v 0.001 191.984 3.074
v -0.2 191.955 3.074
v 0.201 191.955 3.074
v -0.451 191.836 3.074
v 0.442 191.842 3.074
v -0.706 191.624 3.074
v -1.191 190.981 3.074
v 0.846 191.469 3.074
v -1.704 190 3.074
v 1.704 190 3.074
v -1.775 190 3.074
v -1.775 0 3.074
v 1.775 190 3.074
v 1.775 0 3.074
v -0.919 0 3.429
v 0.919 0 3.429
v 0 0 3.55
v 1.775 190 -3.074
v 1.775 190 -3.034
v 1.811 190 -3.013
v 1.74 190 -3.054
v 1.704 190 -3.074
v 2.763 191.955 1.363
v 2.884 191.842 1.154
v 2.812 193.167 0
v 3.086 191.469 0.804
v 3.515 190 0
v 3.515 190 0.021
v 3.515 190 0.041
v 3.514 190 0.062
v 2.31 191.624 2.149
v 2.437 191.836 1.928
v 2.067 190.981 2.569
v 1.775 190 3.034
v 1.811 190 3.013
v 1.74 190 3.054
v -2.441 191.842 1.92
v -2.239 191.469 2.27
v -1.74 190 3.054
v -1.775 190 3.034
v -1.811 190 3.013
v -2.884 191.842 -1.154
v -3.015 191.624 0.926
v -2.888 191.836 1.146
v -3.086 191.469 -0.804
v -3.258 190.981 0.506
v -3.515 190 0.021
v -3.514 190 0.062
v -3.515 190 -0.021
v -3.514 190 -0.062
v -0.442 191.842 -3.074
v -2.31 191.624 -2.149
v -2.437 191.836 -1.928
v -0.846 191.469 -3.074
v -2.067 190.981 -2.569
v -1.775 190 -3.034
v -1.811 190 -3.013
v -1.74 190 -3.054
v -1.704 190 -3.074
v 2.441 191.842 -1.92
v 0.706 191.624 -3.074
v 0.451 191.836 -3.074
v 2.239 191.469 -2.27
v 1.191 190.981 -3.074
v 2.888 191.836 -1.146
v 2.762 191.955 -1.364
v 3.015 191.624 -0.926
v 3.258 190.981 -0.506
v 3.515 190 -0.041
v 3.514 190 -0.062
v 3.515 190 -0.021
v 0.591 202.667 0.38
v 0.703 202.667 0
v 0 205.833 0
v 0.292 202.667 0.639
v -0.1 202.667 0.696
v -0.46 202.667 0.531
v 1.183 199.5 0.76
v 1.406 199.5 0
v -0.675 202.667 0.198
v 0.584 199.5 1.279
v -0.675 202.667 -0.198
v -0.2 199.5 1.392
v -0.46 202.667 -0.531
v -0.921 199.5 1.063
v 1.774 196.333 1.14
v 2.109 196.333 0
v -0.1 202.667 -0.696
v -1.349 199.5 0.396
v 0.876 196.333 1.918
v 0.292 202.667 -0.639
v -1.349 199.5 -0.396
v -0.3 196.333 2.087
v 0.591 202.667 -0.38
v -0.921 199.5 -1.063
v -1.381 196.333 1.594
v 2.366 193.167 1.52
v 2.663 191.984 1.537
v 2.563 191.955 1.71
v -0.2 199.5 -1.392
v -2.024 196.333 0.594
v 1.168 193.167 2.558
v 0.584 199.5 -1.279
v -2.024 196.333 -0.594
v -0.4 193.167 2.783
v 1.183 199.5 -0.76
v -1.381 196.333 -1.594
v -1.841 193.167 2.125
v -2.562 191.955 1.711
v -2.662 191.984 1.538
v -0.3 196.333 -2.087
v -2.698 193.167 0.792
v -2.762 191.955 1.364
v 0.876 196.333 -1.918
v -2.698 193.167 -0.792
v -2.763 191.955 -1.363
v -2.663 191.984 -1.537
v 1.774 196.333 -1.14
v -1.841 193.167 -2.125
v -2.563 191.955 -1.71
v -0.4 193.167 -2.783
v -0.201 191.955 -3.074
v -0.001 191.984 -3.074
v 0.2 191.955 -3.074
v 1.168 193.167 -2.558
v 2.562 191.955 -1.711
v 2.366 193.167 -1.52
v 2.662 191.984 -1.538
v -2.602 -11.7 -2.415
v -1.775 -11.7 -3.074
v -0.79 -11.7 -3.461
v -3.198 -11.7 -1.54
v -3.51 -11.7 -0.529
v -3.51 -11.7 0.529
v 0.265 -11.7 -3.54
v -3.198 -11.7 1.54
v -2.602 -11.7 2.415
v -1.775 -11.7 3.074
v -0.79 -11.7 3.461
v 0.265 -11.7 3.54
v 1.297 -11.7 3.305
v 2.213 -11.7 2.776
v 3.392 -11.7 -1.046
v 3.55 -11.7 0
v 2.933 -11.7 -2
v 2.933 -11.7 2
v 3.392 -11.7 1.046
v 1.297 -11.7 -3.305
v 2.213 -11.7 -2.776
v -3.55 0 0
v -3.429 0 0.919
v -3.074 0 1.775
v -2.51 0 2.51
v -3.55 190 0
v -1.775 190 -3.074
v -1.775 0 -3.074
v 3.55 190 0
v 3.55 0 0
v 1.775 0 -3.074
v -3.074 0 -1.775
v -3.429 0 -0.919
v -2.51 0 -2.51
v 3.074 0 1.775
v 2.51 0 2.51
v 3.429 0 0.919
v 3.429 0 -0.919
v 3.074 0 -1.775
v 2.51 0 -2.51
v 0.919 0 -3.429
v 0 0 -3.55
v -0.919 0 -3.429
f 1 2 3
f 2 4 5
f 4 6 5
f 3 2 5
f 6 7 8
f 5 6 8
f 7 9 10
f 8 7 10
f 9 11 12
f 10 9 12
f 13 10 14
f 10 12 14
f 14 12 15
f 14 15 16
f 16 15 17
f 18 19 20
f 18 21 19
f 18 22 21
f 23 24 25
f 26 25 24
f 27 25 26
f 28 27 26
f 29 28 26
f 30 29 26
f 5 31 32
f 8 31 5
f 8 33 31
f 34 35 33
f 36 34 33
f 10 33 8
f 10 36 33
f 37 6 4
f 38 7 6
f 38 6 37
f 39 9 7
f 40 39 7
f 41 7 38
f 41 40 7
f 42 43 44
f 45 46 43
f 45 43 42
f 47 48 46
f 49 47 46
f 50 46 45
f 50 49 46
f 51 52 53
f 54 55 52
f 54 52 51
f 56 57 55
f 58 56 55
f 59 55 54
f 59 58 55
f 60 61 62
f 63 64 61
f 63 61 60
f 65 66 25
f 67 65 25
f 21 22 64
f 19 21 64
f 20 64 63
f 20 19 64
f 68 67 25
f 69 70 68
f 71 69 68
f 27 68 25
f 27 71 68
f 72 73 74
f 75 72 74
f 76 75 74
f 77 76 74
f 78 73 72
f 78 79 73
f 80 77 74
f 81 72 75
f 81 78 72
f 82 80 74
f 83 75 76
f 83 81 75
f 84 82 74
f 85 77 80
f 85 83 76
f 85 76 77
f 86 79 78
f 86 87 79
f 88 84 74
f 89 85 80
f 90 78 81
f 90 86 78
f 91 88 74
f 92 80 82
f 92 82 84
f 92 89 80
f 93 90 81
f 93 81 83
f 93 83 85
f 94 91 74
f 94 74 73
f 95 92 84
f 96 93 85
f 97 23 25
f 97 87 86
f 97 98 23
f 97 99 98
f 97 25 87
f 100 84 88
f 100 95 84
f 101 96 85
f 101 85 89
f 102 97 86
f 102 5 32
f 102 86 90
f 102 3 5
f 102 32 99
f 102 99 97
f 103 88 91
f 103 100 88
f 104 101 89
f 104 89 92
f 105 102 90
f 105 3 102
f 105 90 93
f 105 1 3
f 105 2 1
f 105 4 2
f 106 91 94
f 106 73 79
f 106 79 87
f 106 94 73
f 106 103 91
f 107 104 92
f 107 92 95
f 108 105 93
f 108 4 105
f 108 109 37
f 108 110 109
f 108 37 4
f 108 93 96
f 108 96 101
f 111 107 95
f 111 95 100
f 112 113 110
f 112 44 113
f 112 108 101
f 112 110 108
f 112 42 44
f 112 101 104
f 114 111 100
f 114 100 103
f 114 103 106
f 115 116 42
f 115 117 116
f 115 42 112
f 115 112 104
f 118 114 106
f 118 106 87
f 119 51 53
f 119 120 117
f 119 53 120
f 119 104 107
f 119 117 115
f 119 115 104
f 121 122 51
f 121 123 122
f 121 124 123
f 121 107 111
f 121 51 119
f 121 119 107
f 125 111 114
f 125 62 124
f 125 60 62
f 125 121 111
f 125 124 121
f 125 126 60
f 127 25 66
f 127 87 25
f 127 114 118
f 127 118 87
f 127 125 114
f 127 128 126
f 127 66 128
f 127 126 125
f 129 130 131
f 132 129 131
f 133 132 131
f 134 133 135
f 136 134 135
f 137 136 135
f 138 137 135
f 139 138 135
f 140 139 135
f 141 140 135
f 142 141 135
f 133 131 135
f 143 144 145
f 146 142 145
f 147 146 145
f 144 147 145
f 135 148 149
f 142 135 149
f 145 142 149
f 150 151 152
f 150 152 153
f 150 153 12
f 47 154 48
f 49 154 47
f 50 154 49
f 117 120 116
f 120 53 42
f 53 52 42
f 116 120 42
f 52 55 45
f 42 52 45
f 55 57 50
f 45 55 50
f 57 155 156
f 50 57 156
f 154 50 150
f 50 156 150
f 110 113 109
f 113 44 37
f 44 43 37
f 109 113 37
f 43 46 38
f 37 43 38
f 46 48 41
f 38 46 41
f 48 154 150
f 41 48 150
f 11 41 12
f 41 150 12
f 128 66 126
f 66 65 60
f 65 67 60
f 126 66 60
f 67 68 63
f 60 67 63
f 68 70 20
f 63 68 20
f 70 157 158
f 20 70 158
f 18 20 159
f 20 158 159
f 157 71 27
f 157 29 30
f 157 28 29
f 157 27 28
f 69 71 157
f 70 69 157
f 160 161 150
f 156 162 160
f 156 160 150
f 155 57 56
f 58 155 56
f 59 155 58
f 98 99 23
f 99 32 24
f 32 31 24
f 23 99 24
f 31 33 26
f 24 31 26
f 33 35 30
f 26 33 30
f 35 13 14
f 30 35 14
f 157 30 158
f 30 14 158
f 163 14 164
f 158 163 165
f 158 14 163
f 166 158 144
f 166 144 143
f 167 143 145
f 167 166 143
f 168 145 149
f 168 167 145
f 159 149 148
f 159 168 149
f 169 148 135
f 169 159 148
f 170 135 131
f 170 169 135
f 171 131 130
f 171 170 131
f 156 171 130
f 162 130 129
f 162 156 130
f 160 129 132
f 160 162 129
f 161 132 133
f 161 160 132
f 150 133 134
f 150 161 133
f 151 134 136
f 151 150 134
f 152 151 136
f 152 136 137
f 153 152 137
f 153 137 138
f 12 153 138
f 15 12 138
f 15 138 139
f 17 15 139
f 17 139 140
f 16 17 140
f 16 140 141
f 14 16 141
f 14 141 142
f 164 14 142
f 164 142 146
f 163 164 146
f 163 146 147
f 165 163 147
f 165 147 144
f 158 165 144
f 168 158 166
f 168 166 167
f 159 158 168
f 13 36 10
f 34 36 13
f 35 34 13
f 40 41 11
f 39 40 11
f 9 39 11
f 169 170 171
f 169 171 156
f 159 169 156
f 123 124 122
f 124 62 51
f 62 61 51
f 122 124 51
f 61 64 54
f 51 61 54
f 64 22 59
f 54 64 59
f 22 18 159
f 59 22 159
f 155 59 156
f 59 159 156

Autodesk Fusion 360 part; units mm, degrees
sketch "Sketch1" plane through (0, 0, 0) normal (0, 1, 0) x (1, 0, 0)
  line L0 (1.775, -3.0744) -> (3.55, 0)
  line L1 (3.55, 0) -> (1.775, 3.0744)
  line L2 (1.775, 3.0744) -> (-1.775, 3.0744)
  line L3 (-1.775, 3.0744) -> (-3.55, 0)
  line L4 (-3.55, 0) -> (-1.775, -3.0744)
  line L5 (-1.775, -3.0744) -> (1.775, -3.0744)
  circle A0 centre (0, 0) radius 3.55
  dimension "d6" = 3.55
  dimension "d8" = 7.1
extrude "Extrude1" add sketch "Sketch1" along normal blind 190
sketch "Sketch2" plane through (0, 0, 0) normal (0, 0, 1) x (1, 0, 0)
  line L0 (0, 190) -> (0, 205.8333)
  line L1 (0, 205.8333) -> (3.5149, 190)
  line L2 (0, 190) -> (3.5149, 190)
  dimension "d11" = 15.8333
revolve "Revolve1" add sketch "Sketch2" angle 360 about axis through (0, 190, 0) along (0, 1, 0)
extrude "Extrude2" cut sketch "Sketch1" along normal blind 205 contours L5 A0 | L0 A0 | L1 A0 | L4 A0 | L2 A0 | L3 A0
sketch "Sketch3" plane through (0, 0, 0) normal (1, 0, 0) x (0, 1, 0)
extrude "Extrude3" add sketch "Sketch1" against normal blind 11.7
equation "width = 7.1 mm"
equation "tip_diameter = 2.4 mm"
equation "eraser_holder_height = 11.7 mm"
equation "eraser_height = 4.7 mm"
equation "height = 190 mm"
equation "d6 = width / 2"
equation "d8 = width"
equation "d9 = height"
equation "d11 = height / 12"
equation "d15 = eraser_holder_height * -1"
